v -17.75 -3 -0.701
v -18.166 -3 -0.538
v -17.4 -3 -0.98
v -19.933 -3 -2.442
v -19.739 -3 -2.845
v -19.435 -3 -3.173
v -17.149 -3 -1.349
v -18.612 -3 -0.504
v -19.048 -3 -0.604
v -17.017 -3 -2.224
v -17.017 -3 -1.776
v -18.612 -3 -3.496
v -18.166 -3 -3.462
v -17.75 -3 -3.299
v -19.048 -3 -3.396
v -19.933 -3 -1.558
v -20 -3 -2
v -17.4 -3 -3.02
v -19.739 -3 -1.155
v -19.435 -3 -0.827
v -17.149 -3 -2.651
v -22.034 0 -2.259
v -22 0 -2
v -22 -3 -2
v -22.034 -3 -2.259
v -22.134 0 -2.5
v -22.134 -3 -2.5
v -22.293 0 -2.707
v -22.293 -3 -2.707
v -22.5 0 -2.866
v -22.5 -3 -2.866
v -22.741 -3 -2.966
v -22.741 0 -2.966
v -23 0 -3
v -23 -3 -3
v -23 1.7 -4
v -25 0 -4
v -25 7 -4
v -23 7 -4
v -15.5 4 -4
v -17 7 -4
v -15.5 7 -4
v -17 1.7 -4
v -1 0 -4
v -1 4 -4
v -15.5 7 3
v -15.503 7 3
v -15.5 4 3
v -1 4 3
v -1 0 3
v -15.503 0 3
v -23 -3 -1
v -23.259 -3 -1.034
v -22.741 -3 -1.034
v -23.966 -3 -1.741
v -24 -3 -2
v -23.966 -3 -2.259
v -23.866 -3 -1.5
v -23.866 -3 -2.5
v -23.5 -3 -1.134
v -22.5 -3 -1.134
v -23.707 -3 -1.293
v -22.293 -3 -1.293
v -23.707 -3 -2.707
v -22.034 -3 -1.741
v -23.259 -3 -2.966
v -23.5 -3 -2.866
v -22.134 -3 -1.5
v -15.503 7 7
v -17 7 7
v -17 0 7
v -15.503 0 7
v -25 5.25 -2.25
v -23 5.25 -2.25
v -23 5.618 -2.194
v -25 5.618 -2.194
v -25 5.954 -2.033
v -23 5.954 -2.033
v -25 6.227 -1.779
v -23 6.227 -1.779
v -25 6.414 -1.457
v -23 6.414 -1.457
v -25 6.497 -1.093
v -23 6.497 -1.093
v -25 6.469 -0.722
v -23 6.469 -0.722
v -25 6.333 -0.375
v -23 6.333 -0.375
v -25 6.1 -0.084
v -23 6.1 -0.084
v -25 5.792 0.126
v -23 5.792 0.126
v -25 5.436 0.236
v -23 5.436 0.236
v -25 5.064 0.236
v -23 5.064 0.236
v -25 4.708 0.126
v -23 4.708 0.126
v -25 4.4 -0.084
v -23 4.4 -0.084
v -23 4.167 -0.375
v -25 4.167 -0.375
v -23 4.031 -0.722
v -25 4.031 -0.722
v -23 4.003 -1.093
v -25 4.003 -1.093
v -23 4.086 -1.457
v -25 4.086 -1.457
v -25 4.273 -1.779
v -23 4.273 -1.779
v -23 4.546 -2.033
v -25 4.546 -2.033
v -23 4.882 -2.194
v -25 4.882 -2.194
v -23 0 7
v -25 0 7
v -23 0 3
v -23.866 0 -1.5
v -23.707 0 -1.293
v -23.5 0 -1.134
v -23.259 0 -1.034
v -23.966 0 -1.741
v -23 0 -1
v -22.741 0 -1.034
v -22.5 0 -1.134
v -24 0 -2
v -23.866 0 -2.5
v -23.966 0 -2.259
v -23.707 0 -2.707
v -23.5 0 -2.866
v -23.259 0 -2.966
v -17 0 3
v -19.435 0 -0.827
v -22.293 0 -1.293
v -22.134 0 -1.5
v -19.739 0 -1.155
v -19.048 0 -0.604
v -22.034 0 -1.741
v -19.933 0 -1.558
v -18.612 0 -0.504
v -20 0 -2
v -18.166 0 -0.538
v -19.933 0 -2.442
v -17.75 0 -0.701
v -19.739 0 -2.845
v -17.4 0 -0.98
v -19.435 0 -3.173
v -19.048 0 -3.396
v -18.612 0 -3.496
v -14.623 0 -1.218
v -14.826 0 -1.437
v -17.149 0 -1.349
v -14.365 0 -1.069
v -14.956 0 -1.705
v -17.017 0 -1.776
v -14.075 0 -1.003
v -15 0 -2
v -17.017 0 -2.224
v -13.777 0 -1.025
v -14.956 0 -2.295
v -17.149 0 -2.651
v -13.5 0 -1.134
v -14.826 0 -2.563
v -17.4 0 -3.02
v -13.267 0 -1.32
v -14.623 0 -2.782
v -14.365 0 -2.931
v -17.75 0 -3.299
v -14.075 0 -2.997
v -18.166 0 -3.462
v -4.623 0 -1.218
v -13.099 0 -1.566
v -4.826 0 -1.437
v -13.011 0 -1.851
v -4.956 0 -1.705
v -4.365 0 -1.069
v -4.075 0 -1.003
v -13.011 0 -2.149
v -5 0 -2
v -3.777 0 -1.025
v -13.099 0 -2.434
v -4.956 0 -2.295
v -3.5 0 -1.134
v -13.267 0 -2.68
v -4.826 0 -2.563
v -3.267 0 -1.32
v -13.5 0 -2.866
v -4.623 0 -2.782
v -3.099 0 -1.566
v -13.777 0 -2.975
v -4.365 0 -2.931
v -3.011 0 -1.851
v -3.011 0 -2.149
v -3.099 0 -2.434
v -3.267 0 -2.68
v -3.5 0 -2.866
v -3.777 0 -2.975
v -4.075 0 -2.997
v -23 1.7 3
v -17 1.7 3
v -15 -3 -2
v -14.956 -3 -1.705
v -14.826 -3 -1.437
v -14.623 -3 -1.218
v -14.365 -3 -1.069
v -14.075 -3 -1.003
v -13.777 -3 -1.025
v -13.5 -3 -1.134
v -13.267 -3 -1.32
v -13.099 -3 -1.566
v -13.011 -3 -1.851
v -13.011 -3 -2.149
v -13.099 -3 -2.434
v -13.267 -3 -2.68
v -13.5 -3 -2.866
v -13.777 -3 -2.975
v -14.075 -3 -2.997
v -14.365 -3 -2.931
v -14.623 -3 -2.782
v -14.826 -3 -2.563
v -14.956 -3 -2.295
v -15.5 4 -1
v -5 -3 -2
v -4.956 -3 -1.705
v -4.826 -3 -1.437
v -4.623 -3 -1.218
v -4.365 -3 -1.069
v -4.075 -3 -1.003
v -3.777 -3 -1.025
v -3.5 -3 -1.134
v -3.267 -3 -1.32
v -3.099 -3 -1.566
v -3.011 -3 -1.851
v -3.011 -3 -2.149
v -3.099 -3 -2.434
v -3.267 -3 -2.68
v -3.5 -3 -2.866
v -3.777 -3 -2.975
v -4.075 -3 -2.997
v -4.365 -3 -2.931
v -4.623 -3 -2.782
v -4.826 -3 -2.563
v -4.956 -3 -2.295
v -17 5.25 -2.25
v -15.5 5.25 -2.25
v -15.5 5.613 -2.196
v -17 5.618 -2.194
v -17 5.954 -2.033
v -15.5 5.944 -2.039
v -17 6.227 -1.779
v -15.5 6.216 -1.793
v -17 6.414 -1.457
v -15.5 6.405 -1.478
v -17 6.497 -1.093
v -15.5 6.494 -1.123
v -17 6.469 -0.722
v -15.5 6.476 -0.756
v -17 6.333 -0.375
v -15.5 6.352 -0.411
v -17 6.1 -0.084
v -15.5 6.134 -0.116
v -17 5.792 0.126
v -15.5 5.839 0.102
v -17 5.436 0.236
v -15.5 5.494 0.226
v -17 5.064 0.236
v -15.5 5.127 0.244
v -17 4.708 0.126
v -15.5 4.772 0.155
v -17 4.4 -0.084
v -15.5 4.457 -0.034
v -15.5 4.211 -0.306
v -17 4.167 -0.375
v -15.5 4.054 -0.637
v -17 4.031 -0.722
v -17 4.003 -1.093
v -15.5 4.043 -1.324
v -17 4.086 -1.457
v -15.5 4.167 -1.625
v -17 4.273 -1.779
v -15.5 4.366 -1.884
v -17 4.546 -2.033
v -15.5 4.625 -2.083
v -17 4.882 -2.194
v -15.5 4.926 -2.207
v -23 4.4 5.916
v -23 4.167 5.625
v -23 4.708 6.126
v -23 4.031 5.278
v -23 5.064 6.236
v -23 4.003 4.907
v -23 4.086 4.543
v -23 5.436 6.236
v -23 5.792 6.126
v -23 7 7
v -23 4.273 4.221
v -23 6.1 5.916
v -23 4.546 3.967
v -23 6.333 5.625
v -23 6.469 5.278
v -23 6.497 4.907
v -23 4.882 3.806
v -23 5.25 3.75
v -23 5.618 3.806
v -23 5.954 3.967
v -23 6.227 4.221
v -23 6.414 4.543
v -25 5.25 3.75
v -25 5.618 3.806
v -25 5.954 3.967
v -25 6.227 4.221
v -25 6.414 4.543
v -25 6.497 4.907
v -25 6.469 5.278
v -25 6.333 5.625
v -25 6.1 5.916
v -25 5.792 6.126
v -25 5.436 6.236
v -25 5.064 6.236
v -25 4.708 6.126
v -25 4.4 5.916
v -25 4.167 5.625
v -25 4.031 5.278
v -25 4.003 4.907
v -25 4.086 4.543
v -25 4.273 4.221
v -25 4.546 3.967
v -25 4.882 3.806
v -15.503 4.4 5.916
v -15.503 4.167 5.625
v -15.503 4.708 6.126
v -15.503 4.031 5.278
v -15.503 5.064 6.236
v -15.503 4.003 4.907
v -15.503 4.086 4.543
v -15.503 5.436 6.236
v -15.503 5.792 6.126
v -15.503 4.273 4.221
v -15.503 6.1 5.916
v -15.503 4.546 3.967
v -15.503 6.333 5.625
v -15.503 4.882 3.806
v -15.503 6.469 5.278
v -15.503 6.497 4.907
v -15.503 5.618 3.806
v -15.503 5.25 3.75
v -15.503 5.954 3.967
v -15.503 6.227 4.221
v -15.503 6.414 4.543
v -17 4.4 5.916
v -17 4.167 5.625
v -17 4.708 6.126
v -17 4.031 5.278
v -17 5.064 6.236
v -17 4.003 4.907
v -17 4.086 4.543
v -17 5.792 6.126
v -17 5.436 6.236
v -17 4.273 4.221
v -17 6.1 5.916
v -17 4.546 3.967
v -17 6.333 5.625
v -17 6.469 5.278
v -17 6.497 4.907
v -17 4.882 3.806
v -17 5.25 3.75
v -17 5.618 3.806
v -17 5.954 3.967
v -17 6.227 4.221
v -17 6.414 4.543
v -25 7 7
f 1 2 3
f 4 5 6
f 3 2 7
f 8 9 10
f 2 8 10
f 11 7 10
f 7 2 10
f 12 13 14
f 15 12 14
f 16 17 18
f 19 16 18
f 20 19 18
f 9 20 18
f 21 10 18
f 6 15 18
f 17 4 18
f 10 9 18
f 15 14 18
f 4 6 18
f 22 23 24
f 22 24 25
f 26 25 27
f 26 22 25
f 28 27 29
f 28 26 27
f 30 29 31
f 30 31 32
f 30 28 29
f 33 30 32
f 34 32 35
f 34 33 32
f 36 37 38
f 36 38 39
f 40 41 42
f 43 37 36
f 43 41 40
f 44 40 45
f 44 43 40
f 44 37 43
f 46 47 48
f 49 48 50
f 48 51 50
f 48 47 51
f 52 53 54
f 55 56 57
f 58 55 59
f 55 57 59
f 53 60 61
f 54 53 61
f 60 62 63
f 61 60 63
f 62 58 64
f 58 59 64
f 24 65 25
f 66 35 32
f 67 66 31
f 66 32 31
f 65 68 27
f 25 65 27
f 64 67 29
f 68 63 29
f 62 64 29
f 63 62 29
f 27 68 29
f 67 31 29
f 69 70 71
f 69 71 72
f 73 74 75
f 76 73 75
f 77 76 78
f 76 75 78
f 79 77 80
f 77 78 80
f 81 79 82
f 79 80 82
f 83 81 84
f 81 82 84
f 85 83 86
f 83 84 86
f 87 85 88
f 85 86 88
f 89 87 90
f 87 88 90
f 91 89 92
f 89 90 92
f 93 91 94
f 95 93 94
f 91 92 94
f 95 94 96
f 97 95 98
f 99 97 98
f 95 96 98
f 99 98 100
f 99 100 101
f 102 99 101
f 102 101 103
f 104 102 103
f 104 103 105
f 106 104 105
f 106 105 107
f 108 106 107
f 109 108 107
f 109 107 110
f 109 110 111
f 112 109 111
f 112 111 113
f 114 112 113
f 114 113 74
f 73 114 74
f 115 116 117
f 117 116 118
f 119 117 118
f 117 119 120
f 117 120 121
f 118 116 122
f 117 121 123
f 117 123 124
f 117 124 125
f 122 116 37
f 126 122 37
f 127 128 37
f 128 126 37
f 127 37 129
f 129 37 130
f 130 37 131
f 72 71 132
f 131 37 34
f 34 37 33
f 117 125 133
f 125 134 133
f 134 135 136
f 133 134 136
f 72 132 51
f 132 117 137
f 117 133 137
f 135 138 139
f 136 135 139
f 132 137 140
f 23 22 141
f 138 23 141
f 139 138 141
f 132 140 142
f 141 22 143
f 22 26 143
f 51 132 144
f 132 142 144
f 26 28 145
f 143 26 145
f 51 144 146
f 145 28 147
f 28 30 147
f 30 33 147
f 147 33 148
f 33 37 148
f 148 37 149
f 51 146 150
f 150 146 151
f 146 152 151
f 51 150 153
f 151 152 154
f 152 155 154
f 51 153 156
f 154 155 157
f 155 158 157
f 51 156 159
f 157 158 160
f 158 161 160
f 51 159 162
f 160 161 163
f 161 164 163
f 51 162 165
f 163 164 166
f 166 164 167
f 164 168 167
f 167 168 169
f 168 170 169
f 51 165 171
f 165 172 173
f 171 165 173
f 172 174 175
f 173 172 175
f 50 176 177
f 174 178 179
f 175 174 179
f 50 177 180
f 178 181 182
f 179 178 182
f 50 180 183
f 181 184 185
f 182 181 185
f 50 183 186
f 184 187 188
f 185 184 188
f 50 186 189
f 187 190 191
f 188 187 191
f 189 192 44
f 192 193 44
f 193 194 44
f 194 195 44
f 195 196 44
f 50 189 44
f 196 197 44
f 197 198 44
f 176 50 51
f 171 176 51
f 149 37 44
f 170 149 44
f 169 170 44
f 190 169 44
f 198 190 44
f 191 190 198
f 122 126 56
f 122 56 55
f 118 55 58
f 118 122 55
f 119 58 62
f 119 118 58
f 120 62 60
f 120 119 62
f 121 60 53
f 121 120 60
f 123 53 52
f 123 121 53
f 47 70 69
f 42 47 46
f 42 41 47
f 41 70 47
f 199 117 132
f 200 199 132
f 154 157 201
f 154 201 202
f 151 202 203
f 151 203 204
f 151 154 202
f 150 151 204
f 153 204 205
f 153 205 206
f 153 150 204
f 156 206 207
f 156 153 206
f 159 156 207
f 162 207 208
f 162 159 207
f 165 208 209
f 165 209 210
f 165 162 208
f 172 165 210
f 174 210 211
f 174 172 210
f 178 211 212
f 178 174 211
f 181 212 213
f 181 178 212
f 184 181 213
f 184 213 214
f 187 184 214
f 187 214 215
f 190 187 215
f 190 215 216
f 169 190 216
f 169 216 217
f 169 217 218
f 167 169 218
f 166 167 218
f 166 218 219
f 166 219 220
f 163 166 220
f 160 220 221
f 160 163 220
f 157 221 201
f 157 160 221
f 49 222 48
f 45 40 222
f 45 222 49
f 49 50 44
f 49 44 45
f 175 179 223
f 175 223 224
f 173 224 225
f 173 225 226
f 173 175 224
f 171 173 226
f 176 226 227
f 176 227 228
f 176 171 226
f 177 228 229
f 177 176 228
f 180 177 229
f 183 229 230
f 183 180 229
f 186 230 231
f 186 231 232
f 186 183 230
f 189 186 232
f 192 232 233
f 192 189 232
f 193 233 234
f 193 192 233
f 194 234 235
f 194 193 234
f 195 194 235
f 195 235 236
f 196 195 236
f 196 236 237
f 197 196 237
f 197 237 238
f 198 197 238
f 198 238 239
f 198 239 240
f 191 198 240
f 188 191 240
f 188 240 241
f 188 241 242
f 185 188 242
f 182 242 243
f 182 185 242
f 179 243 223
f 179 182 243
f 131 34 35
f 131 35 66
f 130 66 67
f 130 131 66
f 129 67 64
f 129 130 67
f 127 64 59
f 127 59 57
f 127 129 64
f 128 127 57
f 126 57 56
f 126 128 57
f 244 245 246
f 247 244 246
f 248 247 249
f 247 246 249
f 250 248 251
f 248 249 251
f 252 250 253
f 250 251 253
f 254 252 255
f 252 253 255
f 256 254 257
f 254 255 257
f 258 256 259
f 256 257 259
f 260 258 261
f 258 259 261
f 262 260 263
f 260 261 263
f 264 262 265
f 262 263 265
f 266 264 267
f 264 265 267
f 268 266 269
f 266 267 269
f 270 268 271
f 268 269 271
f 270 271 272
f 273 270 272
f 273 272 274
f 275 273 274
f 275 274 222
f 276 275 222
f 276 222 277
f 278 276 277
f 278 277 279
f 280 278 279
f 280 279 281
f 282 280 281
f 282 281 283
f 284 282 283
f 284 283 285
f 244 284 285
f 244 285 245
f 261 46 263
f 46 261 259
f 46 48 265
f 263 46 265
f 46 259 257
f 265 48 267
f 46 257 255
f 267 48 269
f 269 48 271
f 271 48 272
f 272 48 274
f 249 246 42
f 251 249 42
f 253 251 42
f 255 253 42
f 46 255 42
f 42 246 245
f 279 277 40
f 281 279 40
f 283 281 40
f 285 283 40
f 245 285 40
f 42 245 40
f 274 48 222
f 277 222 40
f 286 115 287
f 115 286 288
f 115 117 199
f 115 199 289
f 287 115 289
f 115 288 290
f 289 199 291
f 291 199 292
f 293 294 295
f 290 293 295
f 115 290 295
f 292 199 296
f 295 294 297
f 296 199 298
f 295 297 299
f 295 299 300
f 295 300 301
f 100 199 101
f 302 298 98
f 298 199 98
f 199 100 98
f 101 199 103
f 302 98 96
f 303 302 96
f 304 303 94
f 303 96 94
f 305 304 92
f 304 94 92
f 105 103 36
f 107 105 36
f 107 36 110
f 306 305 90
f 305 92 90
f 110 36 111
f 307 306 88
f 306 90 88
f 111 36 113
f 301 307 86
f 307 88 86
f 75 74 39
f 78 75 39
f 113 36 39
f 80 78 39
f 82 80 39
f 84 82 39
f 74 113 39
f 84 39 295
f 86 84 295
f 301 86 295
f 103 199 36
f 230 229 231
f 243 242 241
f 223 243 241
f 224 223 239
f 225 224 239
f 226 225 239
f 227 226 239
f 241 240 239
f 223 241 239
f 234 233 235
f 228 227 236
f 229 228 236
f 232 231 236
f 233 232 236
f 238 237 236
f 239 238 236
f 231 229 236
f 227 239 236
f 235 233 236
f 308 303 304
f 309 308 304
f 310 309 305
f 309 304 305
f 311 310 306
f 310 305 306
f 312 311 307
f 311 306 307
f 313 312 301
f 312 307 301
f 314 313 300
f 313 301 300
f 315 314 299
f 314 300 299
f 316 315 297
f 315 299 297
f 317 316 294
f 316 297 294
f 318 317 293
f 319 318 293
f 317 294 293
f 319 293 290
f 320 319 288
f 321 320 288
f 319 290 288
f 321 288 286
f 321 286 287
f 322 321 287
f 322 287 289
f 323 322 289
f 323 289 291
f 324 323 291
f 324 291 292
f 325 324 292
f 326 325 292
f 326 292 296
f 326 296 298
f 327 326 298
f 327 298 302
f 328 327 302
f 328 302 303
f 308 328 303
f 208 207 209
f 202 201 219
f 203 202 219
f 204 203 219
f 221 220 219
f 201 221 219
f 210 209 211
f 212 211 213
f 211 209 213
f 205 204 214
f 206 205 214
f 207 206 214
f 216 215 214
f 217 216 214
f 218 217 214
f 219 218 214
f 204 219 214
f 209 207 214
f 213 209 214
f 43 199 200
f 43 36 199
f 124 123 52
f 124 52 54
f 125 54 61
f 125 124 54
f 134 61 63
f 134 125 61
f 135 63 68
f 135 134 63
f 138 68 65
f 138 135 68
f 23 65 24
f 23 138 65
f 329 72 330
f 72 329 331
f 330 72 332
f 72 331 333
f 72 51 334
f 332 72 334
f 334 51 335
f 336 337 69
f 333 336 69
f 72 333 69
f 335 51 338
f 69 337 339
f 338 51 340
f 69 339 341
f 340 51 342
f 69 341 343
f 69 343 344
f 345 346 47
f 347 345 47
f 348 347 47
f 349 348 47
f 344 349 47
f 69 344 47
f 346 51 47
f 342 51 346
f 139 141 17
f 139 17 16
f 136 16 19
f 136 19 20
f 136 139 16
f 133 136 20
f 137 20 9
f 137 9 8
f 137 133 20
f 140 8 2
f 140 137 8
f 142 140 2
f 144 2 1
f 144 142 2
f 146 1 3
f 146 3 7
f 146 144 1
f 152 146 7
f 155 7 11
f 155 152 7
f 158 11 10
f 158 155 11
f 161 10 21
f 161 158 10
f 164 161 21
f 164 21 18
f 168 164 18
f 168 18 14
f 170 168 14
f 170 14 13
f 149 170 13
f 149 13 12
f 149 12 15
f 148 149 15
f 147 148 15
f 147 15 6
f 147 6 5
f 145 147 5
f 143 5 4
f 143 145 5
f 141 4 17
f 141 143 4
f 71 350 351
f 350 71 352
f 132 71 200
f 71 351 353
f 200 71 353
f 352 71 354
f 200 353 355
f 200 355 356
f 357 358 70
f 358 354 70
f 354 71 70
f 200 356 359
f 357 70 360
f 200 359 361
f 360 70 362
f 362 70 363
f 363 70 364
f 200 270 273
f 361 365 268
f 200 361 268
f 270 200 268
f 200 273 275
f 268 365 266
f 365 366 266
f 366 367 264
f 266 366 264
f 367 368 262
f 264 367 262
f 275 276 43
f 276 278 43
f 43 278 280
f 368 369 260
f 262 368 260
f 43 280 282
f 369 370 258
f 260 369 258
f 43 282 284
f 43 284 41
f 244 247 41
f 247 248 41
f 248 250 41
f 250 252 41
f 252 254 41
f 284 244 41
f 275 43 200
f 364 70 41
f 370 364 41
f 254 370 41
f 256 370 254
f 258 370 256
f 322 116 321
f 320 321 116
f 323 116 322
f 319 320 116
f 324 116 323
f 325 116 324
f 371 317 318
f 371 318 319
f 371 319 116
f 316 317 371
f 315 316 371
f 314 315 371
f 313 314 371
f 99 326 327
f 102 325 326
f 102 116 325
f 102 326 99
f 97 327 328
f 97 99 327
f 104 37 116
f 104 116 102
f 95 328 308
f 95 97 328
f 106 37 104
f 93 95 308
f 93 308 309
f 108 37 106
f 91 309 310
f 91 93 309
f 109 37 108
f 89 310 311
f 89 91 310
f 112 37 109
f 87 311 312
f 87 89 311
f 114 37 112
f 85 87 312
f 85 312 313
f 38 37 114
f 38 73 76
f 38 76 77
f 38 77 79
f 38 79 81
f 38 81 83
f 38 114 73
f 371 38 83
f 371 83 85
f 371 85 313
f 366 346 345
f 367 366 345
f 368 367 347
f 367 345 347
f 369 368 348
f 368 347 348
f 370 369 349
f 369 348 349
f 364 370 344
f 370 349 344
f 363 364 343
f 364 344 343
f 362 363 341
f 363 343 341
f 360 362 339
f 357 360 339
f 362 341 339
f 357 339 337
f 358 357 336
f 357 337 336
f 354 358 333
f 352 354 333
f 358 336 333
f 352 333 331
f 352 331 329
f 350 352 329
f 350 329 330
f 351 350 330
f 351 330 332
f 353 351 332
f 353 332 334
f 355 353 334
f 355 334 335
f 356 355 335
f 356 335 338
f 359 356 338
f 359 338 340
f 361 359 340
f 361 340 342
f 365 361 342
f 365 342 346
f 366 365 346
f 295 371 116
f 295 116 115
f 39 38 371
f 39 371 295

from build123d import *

# Parameters (mm, degrees)
BOSS_EXTRUDE1_DEPTH = 3
SKETCH3_W           = 24
SKETCH3_H           = 4
BOSS_EXTRUDE2_DEPTH = 4
SKETCH6_W           = 24
SKETCH6_H           = 4
BOSS_EXTRUDE4_DEPTH = 3
CUT_EXTRUDE1_DEPTH  = 2.3
SKETCH9_W           = 2
SKETCH9_H           = 7
SKETCH9_W_2         = 1.5
BOSS_EXTRUDE5_DEPTH = 3
SKETCH11_W          = 2
SKETCH11_H          = 7
SKETCH11_W_2        = 1.497470588
BOSS_EXTRUDE6_DEPTH = 4
SKETCH10_R          = 1.25
CUT_EXTRUDE2_DEPTH  = 10.5


with BuildPart() as part:
    # Sketch1 → Boss-Extrude1 (new body)
    with BuildSketch(Plane(origin=(0, 0, 0), x_dir=(1, 0, 0), z_dir=(0, 1, 0))):
        with BuildLine():
            ThreePointArc((-17, 2), (-18.5, 3.5), (-20, 2))
            Line((-20, 2), (-17, 2))
        make_face()
        with BuildLine():
            Line((-17, 2), (-20, 2))
            ThreePointArc((-20, 2), (-18.5, 0.5), (-17, 2))
        make_face()
        with BuildLine():
            Line((-23, 3), (-23, 2))
            Line((-23, 2), (-23, 1))
            ThreePointArc((-23, 1), (-22.292893219, 1.292893219), (-22, 2))
            ThreePointArc((-22, 2), (-22.292893219, 2.707106781), (-23, 3))
        make_face()
        with BuildLine():
            Line((-23, 1), (-23, 2))
            Line((-23, 2), (-24, 2))
            ThreePointArc((-24, 2), (-23.707106781, 1.292893219), (-23, 1))
        make_face()
        with BuildLine():
            Line((-24, 2), (-23, 2))
            Line((-23, 2), (-23, 3))
            ThreePointArc((-23, 3), (-23.707106781, 2.707106781), (-24, 2))
        make_face()
        with BuildLine():
            ThreePointArc((-13, 2), (-14, 3), (-15, 2))
            Line((-15, 2), (-13, 2))
        make_face()
        with BuildLine():
            Line((-13, 2), (-15, 2))
            ThreePointArc((-15, 2), (-14, 1), (-13, 2))
        make_face()
        with BuildLine():
            ThreePointArc((-3, 2), (-4, 3), (-5, 2))
            Line((-5, 2), (-3, 2))
        make_face()
        with BuildLine():
            Line((-3, 2), (-5, 2))
            ThreePointArc((-5, 2), (-4, 1), (-3, 2))
        make_face()
    extrude(amount=-BOSS_EXTRUDE1_DEPTH)

    # Sketch3 → Boss-Extrude2 (add)
    with BuildSketch(Plane(origin=(0, 0, 0), x_dir=(1, 0, 0), z_dir=(0, 1, 0))):
        with Locations((-13, 2)):
            Rectangle(SKETCH3_W, SKETCH3_H)
    extrude(amount=BOSS_EXTRUDE2_DEPTH)

    # Sketch6 → Boss-Extrude4 (add)
    with BuildSketch(Plane.XY):
        with Locations((-13, 2)):
            Rectangle(SKETCH6_W, SKETCH6_H)
    extrude(amount=BOSS_EXTRUDE4_DEPTH)

    # Sketch7 → Cut-Extrude1 (cut)
    with BuildSketch(Plane(origin=(0, 4, 0), x_dir=(1, 0, 0), z_dir=(0, 1, 0))):
        Polygon((-23, 0.5), (-23, -3), (-17, -3), (-17, 4), (-23, 4), align=None)
    extrude(amount=-CUT_EXTRUDE1_DEPTH, mode=Mode.SUBTRACT)

    # Sketch9 → Boss-Extrude5 (add)
    with BuildSketch(Plane(origin=(0, 4, 0), x_dir=(1, 0, 0), z_dir=(0, 1, 0))):
        with Locations((-24, 0.5)):
            Rectangle(SKETCH9_W, SKETCH9_H)
        with Locations((-16.25, 0.5)):
            Rectangle(SKETCH9_W_2, SKETCH9_H)
    extrude(amount=BOSS_EXTRUDE5_DEPTH)

    # Sketch11 → Boss-Extrude6 (add)
    with BuildSketch(Plane.XY.offset(3)):
        with Locations((-24, 3.5)):
            Rectangle(SKETCH11_W, SKETCH11_H)
        with Locations((-16.251264706, 3.5)):
            Rectangle(SKETCH11_W_2, SKETCH11_H)
    extrude(amount=BOSS_EXTRUDE6_DEPTH)

    # Sketch10 → Cut-Extrude2 (cut, through all)
    with BuildSketch(Plane(origin=(-15.5, 0, 0), x_dir=(0, 0, -1), z_dir=(1, 0, 0))):
        with Locations((1, 5.25)):
            Circle(SKETCH10_R)
        with Locations((-5, 5.25)):
            Circle(SKETCH10_R)
    extrude(amount=-CUT_EXTRUDE2_DEPTH, mode=Mode.SUBTRACT)


solid = part.part
